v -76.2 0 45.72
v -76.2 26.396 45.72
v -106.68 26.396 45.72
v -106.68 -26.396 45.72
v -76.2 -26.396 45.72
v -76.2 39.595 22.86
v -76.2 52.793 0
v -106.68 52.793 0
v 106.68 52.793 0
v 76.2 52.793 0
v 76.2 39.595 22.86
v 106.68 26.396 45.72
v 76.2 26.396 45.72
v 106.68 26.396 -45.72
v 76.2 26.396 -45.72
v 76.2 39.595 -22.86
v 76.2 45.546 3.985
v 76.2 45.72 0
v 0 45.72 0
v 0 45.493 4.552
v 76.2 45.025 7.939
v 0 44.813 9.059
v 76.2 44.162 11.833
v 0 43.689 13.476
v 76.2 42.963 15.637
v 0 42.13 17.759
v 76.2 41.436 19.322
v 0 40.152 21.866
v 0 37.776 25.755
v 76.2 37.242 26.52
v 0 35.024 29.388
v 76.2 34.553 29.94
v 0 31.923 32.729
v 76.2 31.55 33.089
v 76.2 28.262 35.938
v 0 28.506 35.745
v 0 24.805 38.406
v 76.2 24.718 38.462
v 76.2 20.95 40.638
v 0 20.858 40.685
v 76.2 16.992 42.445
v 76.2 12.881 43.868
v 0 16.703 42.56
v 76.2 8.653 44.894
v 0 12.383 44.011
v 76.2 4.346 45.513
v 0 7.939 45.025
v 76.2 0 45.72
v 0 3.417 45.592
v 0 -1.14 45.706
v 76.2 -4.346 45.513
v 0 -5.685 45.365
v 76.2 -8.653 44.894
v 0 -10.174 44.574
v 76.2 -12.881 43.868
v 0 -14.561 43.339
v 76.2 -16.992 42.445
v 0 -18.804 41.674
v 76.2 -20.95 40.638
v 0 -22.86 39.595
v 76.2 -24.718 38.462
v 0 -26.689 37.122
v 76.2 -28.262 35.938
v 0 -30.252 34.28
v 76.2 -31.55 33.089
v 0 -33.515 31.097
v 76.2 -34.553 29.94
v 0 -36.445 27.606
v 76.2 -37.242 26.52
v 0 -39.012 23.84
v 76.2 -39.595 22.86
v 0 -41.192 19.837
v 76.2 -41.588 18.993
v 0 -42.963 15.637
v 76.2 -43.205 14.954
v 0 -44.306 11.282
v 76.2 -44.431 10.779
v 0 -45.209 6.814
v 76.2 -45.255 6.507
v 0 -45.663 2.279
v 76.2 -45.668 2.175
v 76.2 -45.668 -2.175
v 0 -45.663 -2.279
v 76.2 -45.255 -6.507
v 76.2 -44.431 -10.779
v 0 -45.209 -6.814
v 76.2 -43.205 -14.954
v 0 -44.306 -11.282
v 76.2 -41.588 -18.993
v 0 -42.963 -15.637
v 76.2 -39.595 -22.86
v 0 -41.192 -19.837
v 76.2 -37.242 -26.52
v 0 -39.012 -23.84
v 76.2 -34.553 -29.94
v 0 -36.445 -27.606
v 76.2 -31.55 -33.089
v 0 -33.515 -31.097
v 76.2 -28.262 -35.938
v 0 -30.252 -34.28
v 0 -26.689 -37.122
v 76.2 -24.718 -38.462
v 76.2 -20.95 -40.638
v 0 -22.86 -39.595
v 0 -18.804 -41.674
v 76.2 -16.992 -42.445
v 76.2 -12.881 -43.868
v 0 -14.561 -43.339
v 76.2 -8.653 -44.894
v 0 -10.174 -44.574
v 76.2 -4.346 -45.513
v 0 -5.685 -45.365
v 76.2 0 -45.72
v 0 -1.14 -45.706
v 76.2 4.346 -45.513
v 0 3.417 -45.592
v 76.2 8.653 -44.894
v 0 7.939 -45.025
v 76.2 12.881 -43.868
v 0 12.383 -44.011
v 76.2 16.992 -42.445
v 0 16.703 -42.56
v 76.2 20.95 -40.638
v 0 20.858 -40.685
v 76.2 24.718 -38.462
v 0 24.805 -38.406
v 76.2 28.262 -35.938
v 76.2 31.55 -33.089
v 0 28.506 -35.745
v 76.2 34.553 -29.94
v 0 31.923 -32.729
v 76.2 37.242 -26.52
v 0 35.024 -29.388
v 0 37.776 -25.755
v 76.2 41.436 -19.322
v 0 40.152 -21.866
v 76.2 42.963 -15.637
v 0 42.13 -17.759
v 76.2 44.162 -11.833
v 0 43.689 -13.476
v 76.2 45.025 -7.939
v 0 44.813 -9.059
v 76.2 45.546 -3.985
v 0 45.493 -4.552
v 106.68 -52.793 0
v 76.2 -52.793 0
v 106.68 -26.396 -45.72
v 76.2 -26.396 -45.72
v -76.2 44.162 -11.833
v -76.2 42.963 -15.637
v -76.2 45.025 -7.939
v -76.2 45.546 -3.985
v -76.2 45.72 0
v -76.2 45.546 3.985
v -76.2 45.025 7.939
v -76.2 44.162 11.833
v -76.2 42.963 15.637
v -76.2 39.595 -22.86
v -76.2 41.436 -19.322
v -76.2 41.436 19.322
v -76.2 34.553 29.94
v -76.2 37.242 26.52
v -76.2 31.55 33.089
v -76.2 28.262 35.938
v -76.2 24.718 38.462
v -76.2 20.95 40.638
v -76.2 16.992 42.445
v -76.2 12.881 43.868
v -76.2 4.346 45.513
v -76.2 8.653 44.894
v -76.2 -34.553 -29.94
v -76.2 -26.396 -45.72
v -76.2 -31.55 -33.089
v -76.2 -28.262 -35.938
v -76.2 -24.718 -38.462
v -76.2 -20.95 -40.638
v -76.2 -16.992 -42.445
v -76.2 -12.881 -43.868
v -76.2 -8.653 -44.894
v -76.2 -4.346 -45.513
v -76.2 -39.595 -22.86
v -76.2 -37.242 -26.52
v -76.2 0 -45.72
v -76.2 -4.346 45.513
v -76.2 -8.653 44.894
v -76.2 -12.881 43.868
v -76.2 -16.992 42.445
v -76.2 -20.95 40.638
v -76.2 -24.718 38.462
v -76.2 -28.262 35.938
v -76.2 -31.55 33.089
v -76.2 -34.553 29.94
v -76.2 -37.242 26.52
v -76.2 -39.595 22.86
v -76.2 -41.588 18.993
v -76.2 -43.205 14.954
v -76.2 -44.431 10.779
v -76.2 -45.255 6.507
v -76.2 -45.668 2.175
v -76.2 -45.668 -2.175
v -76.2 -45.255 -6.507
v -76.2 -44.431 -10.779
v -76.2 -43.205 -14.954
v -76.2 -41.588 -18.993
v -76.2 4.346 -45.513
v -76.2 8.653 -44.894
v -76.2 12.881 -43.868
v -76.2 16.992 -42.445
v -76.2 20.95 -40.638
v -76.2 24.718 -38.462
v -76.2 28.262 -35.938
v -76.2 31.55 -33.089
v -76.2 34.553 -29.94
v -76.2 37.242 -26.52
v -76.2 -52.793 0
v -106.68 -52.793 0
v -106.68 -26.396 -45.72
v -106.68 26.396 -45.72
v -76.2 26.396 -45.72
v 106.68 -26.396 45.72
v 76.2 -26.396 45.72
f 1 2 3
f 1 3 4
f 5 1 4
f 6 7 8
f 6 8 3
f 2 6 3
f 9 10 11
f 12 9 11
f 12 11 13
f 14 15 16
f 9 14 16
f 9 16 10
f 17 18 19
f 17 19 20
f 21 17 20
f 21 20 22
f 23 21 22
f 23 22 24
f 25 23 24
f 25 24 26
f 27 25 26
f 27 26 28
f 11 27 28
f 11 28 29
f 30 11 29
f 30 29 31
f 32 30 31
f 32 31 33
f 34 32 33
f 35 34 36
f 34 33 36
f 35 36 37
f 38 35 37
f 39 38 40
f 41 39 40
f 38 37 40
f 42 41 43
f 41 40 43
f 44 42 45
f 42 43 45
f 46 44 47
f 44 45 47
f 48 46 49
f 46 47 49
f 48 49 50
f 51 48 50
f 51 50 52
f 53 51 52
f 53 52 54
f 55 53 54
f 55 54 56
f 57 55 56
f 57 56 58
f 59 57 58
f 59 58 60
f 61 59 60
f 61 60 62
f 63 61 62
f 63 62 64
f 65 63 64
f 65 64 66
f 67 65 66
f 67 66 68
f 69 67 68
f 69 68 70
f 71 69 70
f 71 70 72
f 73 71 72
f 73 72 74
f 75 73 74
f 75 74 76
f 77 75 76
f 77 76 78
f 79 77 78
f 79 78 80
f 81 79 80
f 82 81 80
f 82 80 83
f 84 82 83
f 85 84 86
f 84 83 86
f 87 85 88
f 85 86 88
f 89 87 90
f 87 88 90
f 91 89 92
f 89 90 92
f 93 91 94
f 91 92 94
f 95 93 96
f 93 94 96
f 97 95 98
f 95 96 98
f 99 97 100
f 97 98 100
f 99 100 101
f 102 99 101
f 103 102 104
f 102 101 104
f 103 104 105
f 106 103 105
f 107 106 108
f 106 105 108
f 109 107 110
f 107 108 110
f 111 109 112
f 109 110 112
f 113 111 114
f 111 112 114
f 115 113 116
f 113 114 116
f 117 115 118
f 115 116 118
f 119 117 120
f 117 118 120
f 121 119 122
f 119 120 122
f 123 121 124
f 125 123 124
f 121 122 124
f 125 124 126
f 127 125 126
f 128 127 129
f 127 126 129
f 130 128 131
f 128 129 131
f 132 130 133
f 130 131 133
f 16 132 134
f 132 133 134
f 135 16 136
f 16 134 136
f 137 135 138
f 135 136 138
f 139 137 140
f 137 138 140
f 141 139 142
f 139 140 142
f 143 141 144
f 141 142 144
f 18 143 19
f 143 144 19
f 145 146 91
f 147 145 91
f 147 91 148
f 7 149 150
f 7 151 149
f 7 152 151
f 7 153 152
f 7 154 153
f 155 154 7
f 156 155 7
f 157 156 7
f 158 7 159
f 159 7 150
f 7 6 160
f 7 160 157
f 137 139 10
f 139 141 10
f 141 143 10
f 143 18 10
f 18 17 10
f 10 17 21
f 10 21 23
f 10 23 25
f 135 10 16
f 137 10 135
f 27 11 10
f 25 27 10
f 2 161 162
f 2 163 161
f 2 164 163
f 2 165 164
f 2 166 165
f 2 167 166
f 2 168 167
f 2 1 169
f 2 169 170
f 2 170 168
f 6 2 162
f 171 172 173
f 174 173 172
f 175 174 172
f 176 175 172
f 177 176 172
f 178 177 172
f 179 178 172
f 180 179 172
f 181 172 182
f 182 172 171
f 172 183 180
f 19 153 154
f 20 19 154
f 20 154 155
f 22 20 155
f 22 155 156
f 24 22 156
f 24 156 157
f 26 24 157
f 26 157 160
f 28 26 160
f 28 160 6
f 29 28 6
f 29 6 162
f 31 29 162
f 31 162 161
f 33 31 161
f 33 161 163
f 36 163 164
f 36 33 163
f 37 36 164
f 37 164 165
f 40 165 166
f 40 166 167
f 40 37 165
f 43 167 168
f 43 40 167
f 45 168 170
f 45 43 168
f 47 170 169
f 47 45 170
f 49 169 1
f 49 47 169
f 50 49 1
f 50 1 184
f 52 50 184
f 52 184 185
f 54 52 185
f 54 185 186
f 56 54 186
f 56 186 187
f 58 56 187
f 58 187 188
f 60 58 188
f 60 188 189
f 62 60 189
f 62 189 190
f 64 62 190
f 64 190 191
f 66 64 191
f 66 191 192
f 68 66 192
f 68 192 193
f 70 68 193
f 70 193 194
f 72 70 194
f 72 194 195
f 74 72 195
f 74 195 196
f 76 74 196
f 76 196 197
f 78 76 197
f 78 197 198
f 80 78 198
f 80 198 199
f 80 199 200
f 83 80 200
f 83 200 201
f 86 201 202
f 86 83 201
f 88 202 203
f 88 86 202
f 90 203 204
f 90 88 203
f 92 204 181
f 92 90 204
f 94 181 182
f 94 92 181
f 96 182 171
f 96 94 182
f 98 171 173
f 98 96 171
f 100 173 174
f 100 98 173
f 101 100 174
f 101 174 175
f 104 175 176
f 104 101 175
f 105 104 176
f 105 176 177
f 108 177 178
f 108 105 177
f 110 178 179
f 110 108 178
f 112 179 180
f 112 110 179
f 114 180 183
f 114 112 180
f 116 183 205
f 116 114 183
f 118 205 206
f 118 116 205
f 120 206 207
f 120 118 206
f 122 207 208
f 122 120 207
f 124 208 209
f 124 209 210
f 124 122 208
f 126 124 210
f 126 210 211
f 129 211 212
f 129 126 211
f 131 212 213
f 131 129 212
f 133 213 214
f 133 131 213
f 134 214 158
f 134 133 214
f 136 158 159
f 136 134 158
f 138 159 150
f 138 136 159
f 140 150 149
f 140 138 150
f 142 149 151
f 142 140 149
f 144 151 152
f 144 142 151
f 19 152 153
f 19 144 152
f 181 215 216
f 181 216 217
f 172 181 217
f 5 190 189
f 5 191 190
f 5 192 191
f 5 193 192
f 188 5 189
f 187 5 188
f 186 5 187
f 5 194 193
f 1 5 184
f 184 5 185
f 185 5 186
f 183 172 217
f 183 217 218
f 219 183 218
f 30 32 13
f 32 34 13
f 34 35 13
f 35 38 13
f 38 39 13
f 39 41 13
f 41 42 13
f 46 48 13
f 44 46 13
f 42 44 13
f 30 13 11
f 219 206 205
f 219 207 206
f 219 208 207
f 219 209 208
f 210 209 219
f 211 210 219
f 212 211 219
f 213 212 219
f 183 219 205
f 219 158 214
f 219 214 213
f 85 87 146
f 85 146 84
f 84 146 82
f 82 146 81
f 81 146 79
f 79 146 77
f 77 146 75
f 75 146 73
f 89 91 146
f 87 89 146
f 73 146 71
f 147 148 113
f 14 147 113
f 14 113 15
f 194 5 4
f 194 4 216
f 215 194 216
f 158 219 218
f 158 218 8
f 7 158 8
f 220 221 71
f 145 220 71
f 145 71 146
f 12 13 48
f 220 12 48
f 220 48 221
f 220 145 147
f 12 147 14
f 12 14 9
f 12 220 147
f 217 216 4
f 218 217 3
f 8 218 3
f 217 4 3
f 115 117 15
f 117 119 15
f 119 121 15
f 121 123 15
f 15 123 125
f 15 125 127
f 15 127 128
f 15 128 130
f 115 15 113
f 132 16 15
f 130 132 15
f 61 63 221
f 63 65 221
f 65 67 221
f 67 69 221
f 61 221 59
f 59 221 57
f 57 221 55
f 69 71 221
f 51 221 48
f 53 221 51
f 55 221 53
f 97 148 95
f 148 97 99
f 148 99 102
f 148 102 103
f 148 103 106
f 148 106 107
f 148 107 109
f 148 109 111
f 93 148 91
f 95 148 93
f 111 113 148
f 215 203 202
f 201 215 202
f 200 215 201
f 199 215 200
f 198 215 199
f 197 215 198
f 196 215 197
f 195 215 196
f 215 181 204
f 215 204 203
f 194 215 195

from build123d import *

# Parameters (mm, degrees)
F0_R     = 45.72
F1_DEPTH = 76.2
F3_DEPTH = 30.48


with BuildPart() as f1:
    # F0 (on Right) → F1 (new body)
    with BuildSketch(Plane.YZ):
        Circle(F0_R)
    extrude(amount=F1_DEPTH)

    # F2 (on face) → F3 (join)
    with BuildSketch(Plane.YZ.offset(76.2)):
        Polygon((-26.396454, -45.72), (26.396454, -45.72), (52.792909, 0), (26.396454, 45.72), (-26.396454, 45.72), (-52.792909, 0), align=None)
    extrude(amount=F3_DEPTH)

    # F4: F1 across plane


with BuildPart() as f1_1:
    add(f1.part)
    add(f1.part.mirror(Plane.YZ))


solid = f1_1.part
